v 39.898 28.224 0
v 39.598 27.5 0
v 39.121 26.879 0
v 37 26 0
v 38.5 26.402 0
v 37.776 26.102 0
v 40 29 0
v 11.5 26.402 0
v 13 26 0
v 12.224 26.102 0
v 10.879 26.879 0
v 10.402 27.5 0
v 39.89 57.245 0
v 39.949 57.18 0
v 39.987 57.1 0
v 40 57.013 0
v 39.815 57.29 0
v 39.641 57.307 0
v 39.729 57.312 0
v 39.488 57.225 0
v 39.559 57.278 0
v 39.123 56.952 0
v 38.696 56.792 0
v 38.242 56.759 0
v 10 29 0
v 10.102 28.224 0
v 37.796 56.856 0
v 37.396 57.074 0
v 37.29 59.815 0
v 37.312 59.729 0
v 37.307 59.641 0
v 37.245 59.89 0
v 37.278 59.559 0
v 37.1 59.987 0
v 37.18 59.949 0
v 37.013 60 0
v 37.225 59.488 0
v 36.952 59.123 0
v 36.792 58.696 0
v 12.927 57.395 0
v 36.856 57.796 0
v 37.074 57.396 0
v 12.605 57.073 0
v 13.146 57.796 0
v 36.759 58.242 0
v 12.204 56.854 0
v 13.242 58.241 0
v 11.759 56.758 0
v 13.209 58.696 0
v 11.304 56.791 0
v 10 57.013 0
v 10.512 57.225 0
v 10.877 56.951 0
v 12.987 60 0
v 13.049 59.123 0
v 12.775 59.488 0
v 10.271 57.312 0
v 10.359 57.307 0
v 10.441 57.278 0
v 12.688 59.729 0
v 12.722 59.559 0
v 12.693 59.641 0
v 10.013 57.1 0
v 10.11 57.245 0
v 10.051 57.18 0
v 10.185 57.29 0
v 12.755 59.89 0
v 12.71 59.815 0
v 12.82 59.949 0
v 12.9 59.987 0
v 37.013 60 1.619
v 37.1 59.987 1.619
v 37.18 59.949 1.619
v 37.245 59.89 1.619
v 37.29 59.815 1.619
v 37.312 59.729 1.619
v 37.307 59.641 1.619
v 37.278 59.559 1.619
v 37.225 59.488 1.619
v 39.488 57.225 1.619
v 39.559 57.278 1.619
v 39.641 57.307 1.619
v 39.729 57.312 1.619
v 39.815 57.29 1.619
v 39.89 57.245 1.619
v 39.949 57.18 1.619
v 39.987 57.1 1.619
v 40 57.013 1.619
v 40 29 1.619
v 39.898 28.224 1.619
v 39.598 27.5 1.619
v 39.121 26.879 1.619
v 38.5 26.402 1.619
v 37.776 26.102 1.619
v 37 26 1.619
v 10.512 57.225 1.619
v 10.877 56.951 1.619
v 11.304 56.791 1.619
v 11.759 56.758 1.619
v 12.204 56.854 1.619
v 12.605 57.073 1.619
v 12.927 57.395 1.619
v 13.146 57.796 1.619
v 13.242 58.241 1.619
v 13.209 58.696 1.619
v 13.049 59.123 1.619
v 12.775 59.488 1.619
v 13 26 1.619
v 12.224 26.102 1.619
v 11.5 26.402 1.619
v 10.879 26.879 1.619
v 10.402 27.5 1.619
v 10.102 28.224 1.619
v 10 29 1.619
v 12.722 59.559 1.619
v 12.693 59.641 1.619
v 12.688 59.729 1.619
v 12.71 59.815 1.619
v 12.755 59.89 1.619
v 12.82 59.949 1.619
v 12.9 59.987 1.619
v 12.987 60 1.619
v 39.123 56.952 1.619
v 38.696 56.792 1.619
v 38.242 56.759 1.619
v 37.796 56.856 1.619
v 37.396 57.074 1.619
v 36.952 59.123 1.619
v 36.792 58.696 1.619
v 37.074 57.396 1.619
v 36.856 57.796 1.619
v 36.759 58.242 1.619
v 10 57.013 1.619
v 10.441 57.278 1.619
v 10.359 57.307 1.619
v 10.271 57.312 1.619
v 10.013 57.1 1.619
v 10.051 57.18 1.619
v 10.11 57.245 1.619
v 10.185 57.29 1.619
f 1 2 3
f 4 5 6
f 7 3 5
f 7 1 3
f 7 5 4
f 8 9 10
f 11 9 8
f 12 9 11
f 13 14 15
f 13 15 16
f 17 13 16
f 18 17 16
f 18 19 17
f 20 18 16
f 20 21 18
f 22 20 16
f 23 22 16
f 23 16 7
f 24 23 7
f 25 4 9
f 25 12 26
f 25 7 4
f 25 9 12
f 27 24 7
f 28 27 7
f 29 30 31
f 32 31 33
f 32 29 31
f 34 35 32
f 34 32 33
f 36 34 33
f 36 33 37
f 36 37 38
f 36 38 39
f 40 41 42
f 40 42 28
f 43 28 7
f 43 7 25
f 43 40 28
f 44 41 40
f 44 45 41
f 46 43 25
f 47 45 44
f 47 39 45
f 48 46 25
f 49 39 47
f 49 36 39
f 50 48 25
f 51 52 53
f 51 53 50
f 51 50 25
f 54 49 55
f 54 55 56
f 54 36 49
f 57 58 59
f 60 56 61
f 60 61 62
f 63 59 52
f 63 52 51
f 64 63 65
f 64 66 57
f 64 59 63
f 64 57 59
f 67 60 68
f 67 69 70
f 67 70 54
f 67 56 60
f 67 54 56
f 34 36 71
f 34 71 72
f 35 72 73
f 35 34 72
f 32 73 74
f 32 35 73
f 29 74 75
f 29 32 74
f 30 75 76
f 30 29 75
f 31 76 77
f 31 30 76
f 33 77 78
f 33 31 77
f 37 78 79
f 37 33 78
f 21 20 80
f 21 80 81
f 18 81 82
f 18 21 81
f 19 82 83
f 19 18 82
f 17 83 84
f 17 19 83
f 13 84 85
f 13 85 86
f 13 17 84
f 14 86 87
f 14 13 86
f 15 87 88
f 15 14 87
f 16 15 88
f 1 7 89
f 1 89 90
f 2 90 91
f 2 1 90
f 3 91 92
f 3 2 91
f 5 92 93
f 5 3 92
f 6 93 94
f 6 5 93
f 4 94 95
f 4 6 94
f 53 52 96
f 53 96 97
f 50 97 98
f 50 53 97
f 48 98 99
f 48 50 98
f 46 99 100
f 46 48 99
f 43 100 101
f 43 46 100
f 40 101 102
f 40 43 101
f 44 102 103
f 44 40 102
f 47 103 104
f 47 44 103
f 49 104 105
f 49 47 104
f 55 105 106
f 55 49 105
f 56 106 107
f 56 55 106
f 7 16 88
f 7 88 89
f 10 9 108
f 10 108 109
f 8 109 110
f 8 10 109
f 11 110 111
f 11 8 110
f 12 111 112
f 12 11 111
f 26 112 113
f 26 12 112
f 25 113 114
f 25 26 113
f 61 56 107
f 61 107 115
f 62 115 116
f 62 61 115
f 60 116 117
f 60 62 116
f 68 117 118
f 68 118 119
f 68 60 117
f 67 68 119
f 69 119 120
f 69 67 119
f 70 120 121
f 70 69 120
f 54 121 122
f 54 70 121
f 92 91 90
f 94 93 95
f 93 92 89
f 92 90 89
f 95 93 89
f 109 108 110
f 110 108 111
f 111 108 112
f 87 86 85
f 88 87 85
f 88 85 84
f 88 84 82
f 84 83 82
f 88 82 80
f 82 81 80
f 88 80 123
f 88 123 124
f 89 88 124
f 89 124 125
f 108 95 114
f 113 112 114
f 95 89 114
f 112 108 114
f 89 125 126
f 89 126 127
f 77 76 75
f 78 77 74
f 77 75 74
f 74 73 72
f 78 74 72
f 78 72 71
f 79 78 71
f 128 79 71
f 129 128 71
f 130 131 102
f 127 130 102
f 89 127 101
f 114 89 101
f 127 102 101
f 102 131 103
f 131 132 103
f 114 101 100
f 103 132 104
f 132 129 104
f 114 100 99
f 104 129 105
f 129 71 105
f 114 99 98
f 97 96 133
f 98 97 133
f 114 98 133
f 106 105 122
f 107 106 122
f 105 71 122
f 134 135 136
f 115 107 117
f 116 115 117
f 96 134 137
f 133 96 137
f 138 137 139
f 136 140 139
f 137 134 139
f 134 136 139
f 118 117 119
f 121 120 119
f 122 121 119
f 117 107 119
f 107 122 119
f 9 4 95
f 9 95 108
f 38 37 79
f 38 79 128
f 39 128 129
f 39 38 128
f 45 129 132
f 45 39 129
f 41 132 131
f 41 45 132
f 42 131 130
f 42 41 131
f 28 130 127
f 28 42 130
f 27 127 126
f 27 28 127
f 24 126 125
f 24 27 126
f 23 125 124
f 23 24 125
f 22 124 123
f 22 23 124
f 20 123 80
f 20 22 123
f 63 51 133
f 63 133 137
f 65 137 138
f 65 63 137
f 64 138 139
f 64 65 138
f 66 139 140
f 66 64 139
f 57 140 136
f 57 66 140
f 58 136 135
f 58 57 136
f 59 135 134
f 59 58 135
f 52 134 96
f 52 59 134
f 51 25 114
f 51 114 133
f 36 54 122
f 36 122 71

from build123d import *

# Parameters (mm, degrees)
BOARD_DEPTH = 1.6194


with BuildPart() as part:
    # Sketch1 → Board (new body)
    with BuildSketch(Plane.XY):
        with BuildLine():
            Line((10, 29), (10, 57.01299))
            ThreePointArc((10, 57.01299), (10.185190901, 57.290158106), (10.51213, 57.22513))
            ThreePointArc((10.51213, 57.22513), (12.777621512, 57.222368475), (12.77487, 59.48786))
            ThreePointArc((12.77487, 59.48786), (12.709829188, 59.814802566), (12.987, 60))
            Line((12.987, 60), (37.01299, 60))
            ThreePointArc((37.01299, 60), (37.290150019, 59.814804479), (37.22512, 59.48787))
            ThreePointArc((37.22512, 59.48787), (37.223732391, 57.223742391), (39.48786, 57.22513))
            ThreePointArc((39.48786, 57.22513), (39.814807186, 57.290168899), (40, 57.01299))
            Line((40, 57.01299), (40, 29))
            ThreePointArc((40, 29), (39.121323273, 26.878676727), (37, 26))
            Line((37, 26), (13, 26))
            ThreePointArc((13, 26), (10.878679656, 26.878679656), (10, 29))
        make_face()
    extrude(amount=BOARD_DEPTH)


solid = part.part
